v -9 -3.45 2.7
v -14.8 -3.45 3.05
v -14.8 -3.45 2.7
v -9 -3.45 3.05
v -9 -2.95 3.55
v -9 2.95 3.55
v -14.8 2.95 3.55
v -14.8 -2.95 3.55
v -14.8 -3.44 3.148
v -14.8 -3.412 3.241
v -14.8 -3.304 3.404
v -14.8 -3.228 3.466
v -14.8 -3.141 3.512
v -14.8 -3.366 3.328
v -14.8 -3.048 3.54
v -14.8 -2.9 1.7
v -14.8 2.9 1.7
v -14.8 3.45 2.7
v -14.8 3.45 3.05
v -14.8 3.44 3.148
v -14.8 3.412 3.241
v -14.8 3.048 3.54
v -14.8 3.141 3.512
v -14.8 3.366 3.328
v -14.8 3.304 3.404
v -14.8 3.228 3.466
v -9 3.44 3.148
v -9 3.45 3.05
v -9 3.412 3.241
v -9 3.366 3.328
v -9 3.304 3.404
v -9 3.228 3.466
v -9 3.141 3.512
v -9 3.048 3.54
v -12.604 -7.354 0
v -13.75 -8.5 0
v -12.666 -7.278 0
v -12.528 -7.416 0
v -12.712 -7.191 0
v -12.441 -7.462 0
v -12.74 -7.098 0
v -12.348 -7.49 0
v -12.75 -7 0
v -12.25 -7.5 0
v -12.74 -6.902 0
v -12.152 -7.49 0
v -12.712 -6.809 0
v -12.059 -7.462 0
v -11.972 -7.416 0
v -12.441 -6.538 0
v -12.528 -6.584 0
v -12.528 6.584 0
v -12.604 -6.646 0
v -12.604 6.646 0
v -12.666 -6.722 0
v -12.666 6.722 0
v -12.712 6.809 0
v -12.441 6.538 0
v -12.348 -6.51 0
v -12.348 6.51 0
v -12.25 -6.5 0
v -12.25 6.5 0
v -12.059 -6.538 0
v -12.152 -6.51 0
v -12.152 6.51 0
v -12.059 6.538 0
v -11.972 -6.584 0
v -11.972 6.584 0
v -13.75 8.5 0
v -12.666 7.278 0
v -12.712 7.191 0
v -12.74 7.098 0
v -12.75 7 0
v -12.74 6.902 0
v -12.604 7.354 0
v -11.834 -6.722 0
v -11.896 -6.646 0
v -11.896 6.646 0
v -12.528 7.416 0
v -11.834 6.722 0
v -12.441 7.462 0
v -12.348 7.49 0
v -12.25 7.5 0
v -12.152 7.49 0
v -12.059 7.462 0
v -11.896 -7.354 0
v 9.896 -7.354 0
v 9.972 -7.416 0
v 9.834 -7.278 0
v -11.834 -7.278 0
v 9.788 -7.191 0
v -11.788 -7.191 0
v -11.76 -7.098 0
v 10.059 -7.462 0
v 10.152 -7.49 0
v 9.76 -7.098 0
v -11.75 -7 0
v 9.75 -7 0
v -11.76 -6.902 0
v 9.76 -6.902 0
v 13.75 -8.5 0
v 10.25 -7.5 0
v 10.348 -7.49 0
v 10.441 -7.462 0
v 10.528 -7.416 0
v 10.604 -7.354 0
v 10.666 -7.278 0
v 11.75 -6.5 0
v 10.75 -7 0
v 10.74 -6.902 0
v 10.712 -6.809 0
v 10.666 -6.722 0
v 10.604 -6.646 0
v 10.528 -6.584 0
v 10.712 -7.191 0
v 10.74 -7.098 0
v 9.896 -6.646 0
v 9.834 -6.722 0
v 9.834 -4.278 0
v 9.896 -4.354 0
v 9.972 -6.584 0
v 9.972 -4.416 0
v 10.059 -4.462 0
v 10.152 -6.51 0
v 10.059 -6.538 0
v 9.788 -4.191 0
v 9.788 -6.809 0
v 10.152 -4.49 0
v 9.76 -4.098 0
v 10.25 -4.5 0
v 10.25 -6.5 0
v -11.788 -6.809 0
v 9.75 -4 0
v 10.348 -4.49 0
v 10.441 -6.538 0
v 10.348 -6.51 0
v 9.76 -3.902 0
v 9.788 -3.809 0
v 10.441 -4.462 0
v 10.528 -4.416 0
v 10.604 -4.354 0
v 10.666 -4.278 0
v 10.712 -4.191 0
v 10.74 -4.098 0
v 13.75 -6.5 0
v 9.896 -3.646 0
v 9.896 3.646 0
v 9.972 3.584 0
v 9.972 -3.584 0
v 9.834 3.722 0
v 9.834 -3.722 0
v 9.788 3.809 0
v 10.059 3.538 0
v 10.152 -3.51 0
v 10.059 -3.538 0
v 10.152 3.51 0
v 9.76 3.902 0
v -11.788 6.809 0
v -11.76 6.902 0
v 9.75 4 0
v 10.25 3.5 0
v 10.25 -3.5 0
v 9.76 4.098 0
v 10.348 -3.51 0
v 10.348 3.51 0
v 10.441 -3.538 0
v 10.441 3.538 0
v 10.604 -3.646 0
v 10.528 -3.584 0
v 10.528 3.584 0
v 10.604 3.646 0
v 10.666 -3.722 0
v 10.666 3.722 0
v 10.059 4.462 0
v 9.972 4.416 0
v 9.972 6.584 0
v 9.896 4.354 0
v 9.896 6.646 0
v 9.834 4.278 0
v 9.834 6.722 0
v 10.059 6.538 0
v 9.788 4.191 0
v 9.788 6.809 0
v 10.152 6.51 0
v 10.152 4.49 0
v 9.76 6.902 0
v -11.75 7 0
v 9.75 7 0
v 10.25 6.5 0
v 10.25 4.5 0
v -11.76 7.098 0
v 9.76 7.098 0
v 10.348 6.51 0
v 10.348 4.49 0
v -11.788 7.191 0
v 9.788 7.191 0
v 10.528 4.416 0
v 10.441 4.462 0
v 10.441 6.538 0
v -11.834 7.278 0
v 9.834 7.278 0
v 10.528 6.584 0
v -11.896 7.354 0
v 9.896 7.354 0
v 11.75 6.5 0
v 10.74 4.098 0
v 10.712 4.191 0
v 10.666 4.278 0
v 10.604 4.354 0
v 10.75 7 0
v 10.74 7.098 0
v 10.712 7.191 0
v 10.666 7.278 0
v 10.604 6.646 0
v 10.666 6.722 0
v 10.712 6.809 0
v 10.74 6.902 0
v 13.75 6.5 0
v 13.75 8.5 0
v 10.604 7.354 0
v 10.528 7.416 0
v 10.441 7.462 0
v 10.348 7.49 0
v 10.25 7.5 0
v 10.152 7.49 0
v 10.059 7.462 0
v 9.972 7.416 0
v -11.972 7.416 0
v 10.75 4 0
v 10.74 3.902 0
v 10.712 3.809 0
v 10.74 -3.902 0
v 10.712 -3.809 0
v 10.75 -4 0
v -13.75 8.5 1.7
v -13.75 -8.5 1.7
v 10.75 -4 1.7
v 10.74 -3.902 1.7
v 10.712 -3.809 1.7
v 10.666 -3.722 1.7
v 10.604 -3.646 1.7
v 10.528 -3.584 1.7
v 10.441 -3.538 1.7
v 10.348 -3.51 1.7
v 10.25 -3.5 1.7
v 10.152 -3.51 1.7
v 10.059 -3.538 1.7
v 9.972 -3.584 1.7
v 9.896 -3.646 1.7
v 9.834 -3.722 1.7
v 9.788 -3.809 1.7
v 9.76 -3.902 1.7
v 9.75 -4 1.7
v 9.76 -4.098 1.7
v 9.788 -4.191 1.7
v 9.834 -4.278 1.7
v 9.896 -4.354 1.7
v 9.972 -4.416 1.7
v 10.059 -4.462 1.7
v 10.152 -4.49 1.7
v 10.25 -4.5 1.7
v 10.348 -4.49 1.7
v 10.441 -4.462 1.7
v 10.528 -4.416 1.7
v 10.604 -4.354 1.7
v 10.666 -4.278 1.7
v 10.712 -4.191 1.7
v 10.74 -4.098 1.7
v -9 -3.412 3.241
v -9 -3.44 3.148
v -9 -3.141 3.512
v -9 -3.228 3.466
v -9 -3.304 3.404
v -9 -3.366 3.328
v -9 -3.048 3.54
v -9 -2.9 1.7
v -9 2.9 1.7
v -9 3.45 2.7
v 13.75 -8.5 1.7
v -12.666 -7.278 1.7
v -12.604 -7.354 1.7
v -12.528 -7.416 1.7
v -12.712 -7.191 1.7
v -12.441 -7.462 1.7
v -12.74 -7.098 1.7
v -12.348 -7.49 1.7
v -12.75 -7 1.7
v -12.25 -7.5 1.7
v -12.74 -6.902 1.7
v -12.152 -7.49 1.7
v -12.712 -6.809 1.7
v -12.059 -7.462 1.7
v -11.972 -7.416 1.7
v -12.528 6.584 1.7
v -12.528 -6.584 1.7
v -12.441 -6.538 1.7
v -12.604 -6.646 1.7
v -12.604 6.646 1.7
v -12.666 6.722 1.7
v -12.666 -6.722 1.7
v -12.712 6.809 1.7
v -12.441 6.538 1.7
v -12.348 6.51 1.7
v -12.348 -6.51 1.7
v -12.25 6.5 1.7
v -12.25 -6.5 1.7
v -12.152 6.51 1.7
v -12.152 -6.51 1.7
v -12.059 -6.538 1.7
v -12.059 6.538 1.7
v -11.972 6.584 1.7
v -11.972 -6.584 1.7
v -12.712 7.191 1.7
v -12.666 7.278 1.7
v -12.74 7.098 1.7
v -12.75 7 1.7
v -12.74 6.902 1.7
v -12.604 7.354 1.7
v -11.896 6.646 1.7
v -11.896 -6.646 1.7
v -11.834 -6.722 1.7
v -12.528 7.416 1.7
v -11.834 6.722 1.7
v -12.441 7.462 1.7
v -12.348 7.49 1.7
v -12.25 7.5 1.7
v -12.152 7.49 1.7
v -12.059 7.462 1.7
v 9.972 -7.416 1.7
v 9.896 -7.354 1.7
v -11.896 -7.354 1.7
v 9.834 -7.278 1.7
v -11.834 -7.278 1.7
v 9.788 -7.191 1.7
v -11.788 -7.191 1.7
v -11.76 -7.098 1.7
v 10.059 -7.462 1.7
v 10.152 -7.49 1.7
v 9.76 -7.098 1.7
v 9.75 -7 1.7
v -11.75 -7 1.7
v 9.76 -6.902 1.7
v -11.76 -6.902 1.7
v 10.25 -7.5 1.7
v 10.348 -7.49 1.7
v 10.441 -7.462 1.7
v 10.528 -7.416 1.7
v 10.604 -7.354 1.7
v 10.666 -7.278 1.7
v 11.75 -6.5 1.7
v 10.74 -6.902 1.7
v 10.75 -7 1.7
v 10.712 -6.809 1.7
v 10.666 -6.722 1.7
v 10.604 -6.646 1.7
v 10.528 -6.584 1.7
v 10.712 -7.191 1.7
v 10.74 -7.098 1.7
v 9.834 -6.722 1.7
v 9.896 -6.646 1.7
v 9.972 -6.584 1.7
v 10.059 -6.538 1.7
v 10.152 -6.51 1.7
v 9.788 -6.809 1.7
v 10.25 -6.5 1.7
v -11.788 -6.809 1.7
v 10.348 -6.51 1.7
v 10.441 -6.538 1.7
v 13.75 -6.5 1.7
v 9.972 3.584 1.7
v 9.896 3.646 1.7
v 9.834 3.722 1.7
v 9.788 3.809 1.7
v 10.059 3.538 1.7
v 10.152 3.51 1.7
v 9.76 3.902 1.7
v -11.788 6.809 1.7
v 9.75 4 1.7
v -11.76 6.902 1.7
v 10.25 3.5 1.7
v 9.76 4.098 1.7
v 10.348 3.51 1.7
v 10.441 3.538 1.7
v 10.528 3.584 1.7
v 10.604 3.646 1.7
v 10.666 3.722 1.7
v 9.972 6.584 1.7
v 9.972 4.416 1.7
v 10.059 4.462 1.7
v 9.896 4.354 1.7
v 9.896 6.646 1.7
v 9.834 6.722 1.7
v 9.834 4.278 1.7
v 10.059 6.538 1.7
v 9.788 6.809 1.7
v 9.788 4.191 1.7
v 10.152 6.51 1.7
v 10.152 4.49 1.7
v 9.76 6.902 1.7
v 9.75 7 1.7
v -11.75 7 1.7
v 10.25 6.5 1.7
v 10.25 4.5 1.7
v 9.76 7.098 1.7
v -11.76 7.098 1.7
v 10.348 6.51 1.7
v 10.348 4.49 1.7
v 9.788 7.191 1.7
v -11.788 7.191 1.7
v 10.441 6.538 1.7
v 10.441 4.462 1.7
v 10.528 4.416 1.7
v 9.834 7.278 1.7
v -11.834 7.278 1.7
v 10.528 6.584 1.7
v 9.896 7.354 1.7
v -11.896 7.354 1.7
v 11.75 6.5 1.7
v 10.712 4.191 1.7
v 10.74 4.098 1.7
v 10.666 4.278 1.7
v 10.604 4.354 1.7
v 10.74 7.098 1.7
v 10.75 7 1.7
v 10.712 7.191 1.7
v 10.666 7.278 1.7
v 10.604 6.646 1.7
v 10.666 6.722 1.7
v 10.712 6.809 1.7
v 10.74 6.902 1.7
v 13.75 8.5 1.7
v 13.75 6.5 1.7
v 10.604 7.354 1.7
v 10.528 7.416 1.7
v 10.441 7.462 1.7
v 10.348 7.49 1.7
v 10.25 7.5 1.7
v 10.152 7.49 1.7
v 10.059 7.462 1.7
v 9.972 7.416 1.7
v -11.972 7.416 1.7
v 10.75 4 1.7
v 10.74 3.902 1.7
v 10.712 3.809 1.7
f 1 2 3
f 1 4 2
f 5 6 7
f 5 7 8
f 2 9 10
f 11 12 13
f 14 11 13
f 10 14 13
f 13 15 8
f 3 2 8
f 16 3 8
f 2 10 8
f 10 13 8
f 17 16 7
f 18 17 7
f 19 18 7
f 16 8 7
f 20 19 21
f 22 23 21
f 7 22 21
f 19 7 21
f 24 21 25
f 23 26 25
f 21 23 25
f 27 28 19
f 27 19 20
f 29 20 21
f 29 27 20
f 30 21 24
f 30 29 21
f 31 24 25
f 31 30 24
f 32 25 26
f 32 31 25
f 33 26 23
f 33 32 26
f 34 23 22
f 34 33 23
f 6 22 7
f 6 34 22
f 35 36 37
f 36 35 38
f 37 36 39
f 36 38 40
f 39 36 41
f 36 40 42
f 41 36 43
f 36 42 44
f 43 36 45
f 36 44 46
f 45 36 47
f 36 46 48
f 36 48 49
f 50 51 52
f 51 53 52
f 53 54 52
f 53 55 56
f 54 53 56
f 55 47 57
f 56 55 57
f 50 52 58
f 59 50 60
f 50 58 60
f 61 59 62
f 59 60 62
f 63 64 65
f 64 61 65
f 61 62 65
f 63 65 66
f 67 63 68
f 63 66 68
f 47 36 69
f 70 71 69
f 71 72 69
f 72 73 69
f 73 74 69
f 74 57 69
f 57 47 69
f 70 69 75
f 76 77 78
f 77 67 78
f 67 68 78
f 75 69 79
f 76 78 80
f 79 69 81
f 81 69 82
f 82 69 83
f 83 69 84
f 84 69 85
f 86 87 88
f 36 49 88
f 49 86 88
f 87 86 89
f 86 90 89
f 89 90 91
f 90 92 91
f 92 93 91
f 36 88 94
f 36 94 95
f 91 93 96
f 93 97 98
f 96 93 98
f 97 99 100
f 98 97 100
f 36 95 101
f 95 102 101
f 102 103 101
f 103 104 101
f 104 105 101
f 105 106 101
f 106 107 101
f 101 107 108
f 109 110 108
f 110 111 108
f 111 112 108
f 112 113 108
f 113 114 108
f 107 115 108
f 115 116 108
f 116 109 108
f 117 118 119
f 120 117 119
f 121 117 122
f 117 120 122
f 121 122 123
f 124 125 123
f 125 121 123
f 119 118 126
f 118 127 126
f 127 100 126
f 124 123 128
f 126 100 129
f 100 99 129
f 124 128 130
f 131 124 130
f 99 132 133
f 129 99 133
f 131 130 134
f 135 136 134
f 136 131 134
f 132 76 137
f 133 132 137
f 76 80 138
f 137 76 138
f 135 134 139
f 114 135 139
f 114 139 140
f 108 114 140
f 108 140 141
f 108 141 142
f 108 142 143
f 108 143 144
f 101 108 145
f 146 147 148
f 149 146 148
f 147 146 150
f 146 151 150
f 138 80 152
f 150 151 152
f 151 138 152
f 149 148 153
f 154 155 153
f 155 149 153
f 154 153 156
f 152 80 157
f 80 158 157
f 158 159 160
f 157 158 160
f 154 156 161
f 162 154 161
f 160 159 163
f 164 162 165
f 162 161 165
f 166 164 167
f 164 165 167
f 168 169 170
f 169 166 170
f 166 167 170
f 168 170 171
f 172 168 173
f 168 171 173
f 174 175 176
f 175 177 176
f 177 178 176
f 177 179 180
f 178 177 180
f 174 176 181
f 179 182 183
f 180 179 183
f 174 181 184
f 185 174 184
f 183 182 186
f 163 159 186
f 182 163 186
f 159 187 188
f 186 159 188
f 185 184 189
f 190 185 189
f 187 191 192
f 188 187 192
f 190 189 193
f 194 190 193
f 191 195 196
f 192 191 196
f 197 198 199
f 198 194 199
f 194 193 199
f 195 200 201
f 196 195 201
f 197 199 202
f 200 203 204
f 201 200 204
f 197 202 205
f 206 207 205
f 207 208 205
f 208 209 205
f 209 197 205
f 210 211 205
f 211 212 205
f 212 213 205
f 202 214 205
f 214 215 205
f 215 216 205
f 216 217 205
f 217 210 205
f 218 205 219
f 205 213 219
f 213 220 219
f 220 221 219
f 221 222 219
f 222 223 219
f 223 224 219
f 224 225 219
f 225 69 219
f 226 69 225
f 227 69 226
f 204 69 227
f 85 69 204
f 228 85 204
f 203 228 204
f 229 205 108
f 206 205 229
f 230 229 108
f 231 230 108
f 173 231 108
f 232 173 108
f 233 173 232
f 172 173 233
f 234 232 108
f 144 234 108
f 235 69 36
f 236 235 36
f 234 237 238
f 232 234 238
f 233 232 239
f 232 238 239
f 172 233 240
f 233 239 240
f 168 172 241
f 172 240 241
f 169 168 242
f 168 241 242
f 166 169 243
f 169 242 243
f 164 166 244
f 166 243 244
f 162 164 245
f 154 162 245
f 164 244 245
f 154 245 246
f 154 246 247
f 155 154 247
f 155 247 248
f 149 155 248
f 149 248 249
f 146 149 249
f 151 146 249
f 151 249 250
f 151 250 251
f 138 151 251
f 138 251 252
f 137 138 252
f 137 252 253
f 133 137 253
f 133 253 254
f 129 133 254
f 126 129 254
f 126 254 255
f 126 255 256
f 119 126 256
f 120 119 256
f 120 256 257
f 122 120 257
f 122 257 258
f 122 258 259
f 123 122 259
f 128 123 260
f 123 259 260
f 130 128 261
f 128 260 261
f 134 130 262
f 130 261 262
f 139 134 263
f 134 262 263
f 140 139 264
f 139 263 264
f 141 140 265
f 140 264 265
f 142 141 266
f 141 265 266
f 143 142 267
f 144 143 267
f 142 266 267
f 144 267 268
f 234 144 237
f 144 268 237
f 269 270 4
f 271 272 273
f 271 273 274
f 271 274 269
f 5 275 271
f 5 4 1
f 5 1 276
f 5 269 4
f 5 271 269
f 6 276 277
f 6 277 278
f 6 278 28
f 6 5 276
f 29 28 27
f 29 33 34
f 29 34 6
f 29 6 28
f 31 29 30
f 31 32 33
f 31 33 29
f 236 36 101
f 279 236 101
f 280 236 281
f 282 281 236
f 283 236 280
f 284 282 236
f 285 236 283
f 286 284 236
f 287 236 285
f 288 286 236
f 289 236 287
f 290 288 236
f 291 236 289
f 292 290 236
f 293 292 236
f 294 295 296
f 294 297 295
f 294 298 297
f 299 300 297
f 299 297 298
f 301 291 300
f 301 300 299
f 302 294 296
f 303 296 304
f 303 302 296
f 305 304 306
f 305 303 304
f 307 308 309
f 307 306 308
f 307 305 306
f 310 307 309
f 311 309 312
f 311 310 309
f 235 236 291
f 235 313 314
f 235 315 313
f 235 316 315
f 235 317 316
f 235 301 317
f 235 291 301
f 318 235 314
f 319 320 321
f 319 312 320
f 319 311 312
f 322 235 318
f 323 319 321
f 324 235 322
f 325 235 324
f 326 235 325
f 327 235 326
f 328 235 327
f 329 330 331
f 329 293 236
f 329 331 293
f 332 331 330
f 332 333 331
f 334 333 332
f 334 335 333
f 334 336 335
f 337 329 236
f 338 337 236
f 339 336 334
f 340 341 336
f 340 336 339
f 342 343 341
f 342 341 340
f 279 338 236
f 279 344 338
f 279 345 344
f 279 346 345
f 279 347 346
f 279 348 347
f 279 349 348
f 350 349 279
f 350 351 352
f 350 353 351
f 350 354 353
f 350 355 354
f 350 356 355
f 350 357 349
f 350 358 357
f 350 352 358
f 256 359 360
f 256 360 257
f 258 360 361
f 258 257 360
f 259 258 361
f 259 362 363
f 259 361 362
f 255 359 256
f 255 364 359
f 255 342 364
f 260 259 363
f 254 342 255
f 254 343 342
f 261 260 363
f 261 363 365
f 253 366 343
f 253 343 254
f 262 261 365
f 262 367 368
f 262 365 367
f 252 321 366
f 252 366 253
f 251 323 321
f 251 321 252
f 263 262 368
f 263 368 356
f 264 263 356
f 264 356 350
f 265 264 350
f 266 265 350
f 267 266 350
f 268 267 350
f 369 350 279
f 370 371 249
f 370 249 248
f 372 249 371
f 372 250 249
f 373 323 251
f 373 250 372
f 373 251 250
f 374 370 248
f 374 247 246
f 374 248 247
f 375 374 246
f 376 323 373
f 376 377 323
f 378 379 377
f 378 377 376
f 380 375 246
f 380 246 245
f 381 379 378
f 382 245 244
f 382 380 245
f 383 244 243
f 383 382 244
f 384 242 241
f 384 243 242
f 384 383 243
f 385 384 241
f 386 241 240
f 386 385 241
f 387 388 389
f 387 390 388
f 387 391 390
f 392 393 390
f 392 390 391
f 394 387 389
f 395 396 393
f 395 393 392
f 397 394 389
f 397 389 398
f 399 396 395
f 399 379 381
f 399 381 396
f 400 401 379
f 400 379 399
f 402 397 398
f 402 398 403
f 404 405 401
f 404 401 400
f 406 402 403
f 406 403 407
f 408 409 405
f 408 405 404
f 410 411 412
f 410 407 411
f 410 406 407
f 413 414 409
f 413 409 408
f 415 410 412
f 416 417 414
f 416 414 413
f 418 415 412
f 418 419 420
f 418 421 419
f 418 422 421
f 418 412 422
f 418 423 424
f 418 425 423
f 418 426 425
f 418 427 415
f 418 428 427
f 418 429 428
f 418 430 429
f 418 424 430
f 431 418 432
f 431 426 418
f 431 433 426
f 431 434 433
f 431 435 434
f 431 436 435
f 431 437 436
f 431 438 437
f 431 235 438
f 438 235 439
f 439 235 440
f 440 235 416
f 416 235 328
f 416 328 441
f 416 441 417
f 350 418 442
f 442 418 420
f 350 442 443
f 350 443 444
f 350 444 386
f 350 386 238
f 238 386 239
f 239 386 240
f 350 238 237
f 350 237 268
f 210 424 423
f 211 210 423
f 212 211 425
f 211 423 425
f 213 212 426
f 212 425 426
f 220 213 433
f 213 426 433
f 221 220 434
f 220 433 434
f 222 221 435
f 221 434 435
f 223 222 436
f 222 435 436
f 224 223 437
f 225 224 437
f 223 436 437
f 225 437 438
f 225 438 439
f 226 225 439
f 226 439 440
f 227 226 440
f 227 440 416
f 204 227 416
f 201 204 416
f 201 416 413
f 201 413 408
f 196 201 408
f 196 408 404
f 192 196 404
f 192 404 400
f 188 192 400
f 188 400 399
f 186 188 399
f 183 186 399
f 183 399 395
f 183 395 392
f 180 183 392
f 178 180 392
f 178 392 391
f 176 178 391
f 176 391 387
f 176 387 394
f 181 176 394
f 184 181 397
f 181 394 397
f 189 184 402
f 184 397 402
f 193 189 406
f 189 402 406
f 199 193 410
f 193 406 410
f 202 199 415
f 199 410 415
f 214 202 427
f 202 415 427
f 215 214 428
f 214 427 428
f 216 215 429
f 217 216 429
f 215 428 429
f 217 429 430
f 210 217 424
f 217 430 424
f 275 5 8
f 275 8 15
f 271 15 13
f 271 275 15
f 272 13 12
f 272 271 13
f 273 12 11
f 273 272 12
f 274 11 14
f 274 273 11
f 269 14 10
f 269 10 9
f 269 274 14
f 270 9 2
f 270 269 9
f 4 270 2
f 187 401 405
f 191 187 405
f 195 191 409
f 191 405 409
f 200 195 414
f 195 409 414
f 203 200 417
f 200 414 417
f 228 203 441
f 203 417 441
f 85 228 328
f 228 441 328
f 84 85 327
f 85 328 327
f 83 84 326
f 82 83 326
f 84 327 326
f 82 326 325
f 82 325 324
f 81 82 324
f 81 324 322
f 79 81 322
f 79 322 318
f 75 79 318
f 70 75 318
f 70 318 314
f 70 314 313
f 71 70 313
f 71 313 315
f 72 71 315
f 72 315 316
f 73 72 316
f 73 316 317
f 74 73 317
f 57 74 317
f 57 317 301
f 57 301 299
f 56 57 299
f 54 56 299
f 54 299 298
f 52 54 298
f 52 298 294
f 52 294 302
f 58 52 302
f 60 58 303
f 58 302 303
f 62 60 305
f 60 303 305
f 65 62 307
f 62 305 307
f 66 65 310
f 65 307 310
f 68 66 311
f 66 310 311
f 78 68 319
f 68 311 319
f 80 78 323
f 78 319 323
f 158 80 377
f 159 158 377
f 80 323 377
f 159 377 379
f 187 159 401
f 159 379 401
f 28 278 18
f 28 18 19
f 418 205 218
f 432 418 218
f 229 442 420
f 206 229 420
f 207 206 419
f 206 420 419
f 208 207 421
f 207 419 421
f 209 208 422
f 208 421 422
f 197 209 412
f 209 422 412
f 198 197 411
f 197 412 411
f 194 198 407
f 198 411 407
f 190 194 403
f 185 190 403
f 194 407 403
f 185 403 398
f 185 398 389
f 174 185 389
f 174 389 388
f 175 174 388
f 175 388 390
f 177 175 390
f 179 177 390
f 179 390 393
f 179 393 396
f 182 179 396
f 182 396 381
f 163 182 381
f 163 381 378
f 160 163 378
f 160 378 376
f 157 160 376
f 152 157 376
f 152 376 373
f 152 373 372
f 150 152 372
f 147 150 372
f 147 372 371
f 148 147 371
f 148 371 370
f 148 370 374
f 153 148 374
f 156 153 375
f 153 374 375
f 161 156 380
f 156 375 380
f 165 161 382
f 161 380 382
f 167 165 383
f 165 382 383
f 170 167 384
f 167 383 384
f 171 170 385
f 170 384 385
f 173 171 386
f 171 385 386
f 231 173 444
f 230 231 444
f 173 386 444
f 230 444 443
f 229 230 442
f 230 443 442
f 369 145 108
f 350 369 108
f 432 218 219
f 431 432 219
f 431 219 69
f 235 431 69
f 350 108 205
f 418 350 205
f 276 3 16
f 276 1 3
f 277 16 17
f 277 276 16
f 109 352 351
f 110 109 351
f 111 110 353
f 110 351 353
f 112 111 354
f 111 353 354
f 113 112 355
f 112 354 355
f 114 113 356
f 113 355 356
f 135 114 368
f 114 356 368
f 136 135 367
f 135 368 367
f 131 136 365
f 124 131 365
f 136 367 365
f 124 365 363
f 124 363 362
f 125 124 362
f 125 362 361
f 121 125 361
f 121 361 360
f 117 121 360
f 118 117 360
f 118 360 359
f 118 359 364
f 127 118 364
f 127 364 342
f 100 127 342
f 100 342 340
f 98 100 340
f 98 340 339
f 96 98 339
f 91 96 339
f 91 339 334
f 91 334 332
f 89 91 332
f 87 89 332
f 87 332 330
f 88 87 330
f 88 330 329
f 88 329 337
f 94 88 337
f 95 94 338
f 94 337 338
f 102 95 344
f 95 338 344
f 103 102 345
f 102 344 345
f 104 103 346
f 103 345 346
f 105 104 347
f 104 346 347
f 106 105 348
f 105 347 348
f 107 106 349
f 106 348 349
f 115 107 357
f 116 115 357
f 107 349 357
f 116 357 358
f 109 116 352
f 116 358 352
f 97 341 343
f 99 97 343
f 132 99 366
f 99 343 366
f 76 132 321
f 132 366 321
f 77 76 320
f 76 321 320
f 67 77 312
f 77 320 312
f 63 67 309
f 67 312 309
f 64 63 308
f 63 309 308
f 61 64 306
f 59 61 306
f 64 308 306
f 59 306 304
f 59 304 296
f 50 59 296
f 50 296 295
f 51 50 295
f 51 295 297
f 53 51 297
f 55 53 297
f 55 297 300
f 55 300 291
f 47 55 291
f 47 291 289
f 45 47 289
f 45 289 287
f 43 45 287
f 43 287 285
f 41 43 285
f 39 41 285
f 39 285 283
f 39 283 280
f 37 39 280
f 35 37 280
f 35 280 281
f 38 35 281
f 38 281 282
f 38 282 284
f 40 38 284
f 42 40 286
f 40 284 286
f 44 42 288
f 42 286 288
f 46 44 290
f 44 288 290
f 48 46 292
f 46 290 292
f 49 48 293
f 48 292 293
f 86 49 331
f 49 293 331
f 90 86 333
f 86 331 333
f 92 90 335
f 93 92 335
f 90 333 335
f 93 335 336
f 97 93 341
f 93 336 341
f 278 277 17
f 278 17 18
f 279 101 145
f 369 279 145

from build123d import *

# Parameters (mm, degrees)
F1_DEPTH      = 1.7
F2_R          = 0.5
F3_DEPTH      = 1.701
F6_DEPTH      = 4.8
F6_DEPTH_BACK = 1


with BuildPart() as f1:
    # F0 (on Top) → F1 (new body)
    with BuildSketch(Plane.XY):
        Polygon((13.75, 6.5), (13.75, 8.5), (-13.75, 8.5), (-13.75, -8.5), (13.75, -8.5), (13.75, -6.5), (11.75, -6.5), (11.75, 6.5), align=None)
    extrude(amount=F1_DEPTH)

    # F2 (on face) → F3 (cut, through all)
    with BuildSketch(Plane.XY.offset(1.7)):
        with Locations((10.25, 7)):
            Circle(F2_R)
        with Locations((10.25, 4)):
            Circle(F2_R)
        with Locations((10.25, -4)):
            Circle(F2_R)
        with Locations((10.25, -7)):
            Circle(F2_R)
        with Locations((-12.25, 7)):
            Circle(F2_R)
        with Locations((-12.25, -7)):
            Circle(F2_R)
    extrude(amount=-F3_DEPTH, mode=Mode.SUBTRACT)


with BuildPart() as f6:
    # F5 (on offset) → F6 (new body, two sides)
    with BuildSketch(Plane.YZ.offset(-13.8)) as f6_sk:
        with BuildLine():
            Line((-2.9, 1.7), (2.9, 1.7))
            Line((2.9, 1.7), (3.45, 2.7))
            Line((3.45, 2.7), (3.45, 3.05))
            ThreePointArc((3.45, 3.05), (3.303553, 3.403553), (2.95, 3.55))
            Line((2.95, 3.55), (-2.95, 3.55))
            ThreePointArc((-2.95, 3.55), (-3.303553, 3.403553), (-3.45, 3.05))
            Line((-3.45, 3.05), (-3.45, 2.7))
            Line((-3.45, 2.7), (-2.9, 1.7))
        make_face()
    extrude(amount=F6_DEPTH)
    extrude(f6_sk.sketch, amount=-F6_DEPTH_BACK)


solid = Compound([f1.part, f6.part])
